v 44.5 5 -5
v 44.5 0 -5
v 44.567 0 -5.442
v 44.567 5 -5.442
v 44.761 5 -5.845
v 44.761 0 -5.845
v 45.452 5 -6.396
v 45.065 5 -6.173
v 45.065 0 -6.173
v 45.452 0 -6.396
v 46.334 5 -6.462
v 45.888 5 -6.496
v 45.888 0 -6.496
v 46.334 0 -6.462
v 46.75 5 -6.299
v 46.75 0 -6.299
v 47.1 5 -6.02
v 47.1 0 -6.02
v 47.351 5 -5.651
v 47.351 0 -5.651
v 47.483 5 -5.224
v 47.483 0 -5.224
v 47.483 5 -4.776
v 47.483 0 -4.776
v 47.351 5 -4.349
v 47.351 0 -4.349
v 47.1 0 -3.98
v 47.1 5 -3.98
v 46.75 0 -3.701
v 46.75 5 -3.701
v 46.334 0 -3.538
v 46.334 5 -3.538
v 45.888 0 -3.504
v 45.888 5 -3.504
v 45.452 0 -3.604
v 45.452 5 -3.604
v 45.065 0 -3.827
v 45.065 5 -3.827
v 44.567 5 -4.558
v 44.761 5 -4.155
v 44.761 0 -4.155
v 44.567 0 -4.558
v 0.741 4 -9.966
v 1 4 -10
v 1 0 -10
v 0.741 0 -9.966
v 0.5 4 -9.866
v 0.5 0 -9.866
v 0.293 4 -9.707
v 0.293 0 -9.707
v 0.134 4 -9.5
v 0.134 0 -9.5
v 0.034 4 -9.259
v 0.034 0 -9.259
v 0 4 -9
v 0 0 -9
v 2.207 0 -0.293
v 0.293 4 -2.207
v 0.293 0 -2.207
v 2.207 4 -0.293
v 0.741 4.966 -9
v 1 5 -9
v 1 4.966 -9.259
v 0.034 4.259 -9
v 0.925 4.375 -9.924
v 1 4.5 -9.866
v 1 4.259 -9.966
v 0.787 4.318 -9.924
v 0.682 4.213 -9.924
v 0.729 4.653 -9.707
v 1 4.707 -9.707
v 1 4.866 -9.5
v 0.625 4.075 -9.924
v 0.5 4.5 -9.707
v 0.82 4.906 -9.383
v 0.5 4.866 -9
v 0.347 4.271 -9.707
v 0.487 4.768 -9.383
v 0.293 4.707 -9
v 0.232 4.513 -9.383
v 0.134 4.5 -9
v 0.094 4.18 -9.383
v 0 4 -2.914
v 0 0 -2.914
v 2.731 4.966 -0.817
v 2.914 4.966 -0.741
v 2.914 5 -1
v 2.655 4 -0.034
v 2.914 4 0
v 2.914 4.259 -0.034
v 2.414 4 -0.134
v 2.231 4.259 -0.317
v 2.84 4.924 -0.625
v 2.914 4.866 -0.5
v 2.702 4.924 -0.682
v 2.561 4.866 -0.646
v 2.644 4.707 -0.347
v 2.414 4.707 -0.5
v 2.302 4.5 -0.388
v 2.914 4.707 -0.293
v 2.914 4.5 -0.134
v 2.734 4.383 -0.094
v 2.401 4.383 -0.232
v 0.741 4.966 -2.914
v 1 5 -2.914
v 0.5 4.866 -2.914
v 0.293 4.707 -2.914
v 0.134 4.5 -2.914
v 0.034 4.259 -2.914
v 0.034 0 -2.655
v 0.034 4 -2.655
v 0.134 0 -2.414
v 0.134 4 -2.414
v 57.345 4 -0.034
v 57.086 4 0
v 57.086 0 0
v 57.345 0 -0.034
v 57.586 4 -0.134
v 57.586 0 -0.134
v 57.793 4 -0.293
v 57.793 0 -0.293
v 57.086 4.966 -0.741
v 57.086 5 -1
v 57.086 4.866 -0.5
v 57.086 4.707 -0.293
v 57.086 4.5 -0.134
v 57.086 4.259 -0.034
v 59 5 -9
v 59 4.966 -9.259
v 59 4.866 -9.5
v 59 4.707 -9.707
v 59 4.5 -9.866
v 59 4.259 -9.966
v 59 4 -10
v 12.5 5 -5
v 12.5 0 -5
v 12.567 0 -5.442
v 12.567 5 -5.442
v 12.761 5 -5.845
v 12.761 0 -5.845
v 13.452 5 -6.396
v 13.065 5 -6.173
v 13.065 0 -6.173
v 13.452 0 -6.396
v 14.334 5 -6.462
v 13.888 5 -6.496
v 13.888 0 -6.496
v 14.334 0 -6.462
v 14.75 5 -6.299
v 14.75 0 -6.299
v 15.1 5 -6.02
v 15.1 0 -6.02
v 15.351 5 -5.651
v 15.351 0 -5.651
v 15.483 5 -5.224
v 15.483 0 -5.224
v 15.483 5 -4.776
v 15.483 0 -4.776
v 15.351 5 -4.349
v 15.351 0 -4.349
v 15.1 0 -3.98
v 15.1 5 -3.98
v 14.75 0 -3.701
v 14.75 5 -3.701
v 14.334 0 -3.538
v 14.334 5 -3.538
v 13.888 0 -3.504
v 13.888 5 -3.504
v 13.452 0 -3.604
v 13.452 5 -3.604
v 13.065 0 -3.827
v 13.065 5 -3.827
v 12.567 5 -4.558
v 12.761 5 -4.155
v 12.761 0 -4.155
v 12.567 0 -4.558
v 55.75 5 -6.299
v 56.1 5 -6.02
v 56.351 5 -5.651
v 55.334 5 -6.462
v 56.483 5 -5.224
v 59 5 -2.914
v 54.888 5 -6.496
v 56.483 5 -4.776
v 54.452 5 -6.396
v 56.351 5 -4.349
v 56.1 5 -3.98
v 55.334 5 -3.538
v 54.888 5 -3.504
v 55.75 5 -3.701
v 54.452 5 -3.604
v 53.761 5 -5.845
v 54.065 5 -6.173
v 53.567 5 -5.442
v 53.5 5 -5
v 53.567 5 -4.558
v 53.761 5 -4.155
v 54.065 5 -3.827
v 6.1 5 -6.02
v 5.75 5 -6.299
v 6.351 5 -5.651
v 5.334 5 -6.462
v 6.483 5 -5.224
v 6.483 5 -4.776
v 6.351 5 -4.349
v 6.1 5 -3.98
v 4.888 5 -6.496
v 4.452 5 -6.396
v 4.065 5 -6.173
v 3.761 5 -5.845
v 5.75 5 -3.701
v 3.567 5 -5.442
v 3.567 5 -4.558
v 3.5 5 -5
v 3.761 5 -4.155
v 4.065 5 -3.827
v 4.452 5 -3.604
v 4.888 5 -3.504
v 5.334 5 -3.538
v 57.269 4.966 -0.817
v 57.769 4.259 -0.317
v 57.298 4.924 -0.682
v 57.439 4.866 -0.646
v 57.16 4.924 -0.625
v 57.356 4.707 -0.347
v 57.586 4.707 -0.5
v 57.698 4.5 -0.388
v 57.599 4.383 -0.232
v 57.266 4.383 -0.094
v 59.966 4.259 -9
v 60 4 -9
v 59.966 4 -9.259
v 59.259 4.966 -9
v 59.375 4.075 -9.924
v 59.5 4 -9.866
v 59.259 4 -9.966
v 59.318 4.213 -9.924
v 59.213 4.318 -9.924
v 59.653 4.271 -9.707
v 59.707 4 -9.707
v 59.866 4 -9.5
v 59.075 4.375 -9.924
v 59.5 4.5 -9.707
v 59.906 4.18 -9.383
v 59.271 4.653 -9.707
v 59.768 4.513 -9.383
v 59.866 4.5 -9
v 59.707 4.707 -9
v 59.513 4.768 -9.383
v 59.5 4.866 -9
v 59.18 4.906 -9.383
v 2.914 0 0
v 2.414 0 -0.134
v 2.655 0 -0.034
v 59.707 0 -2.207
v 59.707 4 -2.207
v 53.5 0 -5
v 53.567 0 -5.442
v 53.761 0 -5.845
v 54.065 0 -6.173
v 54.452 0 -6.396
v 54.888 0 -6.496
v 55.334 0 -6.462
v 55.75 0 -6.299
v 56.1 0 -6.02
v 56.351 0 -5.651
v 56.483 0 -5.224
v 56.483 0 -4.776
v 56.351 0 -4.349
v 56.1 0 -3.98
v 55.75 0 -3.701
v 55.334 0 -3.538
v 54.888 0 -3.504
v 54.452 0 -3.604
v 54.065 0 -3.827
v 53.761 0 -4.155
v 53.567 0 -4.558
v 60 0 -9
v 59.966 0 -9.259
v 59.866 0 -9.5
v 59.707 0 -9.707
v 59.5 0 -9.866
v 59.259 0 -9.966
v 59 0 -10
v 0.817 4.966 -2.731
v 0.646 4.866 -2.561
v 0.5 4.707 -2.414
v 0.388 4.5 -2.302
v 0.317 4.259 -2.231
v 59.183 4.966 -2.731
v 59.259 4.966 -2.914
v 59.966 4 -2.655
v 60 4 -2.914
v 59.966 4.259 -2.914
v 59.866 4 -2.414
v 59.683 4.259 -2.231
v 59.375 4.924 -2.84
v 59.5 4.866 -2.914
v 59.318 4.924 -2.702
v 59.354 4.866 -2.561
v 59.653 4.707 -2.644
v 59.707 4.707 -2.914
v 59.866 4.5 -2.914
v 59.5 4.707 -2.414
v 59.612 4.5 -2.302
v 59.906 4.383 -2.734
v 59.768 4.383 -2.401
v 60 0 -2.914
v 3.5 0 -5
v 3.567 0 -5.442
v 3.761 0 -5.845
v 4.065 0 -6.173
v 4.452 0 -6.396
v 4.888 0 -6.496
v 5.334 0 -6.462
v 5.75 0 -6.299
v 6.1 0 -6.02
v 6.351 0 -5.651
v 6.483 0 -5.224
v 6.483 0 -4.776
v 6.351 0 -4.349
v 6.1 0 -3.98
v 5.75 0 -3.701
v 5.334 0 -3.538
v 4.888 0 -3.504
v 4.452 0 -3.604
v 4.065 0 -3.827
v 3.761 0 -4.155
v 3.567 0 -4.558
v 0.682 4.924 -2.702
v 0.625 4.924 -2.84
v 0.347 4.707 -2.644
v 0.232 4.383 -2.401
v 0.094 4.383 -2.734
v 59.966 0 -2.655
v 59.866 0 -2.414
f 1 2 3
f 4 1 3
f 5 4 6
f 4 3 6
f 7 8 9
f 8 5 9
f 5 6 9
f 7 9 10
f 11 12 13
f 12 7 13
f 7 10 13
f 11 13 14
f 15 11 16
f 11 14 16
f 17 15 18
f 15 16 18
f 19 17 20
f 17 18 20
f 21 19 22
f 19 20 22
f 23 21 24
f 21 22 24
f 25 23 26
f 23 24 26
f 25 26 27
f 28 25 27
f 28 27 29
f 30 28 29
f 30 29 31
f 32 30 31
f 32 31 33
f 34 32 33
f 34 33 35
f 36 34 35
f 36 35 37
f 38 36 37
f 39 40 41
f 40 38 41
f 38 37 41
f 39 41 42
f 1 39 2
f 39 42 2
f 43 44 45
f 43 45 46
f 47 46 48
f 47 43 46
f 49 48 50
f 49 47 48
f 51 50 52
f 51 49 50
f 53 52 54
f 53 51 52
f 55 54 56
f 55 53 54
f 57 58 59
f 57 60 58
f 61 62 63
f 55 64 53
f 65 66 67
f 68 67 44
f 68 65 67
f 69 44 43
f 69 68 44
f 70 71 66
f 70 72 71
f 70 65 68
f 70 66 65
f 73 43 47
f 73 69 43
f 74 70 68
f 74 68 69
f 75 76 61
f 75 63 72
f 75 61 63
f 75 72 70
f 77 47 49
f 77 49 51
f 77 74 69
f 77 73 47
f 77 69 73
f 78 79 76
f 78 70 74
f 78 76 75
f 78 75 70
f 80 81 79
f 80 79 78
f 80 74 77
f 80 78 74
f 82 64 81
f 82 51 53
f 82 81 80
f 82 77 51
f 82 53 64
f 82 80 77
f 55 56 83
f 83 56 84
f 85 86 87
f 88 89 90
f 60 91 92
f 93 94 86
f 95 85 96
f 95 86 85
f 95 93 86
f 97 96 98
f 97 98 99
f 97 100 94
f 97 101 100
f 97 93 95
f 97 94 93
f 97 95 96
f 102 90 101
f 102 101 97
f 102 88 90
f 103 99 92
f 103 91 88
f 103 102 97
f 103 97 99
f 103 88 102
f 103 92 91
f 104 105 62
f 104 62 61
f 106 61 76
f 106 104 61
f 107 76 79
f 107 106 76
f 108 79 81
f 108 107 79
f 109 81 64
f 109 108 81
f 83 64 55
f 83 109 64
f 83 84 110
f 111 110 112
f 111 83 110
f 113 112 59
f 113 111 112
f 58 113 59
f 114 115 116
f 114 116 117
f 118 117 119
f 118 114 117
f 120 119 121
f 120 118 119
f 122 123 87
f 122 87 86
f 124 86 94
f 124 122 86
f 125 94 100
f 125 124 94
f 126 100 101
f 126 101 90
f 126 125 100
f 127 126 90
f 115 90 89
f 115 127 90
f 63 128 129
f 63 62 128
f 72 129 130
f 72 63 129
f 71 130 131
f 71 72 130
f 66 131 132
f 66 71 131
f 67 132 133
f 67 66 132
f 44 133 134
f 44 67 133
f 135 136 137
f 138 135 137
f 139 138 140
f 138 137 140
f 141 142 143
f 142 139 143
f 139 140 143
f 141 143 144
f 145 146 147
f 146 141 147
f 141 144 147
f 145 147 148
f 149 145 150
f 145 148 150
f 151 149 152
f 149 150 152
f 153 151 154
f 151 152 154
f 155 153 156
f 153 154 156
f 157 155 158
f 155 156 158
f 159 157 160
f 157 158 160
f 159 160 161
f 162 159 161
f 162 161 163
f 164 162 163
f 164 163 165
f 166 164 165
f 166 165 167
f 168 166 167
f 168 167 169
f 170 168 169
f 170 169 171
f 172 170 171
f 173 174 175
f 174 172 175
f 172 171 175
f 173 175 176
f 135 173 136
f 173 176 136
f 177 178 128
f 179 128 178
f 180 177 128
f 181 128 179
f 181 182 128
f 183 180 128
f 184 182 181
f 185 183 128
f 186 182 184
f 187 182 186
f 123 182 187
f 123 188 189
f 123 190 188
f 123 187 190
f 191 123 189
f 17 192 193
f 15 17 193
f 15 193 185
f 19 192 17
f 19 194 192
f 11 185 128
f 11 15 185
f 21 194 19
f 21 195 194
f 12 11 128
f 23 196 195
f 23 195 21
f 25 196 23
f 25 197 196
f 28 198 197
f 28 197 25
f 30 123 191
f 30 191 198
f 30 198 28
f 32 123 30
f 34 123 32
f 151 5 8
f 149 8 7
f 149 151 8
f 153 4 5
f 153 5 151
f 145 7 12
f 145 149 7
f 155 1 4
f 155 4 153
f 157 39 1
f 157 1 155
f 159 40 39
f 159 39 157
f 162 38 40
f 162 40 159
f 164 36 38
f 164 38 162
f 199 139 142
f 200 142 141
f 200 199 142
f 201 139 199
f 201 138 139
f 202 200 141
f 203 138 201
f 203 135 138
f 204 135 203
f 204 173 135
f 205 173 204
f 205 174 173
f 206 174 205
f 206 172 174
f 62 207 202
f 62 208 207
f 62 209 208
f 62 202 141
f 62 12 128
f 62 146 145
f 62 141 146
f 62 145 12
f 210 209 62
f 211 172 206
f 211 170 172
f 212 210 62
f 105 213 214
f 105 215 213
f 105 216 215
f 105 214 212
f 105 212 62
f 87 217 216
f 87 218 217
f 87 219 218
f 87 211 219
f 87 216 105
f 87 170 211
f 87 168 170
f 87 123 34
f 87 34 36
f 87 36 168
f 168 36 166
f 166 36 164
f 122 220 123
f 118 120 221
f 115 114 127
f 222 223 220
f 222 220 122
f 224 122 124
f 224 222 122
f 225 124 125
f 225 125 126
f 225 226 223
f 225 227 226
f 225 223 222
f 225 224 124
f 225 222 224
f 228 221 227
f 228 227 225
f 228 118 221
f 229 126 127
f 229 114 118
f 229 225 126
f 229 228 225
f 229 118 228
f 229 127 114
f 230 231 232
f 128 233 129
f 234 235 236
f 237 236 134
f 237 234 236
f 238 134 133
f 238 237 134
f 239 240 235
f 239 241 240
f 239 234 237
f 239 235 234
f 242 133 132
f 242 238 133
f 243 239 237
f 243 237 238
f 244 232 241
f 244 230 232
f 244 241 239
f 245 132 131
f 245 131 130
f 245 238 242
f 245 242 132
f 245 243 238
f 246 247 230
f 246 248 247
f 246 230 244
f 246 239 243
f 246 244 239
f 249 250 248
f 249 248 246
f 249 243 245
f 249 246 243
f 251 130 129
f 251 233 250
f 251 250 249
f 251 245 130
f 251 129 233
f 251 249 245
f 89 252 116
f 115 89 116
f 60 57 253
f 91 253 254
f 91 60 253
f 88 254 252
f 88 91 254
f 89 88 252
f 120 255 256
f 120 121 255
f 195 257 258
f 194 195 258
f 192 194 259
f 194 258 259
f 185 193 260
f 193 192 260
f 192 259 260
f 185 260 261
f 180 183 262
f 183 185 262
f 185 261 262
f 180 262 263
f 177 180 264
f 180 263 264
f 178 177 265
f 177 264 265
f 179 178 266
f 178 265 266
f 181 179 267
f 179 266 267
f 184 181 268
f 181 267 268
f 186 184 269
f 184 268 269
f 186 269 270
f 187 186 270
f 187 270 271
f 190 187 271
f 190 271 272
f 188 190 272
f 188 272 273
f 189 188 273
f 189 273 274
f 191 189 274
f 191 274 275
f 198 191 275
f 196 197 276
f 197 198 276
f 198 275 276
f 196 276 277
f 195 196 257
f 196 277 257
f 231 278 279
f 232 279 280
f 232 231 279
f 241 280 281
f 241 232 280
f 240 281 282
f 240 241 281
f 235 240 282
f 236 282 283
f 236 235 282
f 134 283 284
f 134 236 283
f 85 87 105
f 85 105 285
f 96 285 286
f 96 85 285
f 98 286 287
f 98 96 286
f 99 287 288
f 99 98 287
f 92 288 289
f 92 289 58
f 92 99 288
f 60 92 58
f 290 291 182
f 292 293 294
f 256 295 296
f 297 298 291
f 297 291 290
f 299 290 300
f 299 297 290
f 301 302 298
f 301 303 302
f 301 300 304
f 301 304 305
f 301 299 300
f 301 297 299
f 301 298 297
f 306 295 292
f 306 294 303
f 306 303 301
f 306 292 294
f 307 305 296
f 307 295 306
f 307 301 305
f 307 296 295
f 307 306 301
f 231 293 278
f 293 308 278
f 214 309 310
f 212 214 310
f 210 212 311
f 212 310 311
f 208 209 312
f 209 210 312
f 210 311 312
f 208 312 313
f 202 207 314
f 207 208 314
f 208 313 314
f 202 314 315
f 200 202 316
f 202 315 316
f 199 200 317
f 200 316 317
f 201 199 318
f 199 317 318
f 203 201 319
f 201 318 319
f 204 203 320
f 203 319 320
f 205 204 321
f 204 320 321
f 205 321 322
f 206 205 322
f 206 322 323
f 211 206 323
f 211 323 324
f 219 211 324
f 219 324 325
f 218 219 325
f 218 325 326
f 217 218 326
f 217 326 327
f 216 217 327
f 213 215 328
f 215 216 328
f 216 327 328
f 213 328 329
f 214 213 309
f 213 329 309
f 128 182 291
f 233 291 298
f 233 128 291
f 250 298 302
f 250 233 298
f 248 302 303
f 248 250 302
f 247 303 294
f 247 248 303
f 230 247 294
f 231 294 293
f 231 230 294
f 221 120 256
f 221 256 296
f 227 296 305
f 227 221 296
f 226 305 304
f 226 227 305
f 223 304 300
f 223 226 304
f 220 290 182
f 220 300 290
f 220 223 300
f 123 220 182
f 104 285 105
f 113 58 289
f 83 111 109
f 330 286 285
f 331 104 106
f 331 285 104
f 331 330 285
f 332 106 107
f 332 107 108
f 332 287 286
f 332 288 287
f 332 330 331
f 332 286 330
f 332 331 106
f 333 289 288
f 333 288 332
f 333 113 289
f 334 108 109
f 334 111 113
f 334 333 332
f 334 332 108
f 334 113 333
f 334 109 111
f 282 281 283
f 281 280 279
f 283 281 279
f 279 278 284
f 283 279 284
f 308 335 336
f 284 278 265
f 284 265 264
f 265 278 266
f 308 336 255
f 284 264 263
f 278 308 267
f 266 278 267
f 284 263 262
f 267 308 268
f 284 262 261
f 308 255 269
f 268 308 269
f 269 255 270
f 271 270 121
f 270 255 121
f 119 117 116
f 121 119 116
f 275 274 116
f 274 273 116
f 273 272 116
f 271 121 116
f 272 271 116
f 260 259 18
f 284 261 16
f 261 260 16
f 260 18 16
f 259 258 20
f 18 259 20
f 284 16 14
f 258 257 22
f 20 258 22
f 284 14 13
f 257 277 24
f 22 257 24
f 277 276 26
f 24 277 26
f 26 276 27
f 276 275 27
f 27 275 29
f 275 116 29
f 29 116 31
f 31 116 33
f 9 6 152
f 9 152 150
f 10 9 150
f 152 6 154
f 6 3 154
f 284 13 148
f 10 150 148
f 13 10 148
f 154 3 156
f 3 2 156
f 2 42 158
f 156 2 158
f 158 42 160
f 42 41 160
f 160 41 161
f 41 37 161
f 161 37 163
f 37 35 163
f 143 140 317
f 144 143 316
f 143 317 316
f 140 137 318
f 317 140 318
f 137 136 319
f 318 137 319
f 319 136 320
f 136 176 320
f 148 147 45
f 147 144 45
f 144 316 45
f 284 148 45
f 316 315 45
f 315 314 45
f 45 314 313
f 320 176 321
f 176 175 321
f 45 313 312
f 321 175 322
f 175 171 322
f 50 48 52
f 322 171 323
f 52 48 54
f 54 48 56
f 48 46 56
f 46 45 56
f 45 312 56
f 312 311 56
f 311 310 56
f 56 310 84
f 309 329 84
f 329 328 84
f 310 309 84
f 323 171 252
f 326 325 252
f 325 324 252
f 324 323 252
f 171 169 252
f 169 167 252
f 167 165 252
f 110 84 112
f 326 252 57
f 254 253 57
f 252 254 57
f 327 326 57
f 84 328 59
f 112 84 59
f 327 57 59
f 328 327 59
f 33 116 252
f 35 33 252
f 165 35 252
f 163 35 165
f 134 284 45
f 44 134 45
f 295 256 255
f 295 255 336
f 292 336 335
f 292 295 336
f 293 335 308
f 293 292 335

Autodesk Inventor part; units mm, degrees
ref_plane "YZ Plane" through (0, 0, 0) normal (1, 0, 0) x (0, 1, 0)
ref_plane "XZ Plane" through (0, 0, 0) normal (0, 1, 0) x (-1, 0, 0)
ref_plane "XY Plane" through (0, 0, 0) normal (0, 0, 1) x (1, 0, 0)
sketch "Sketch1" plane through (0, 0, 0) normal (0, 1, 0) x (-1, 0, 0)
  line L0 (0, 0) -> (-60, 0)
  line L1 (-60, 0) -> (-60, -10)
  line L2 (-60, -10) -> (0, -10)
  line L3 (0, -10) -> (0, 0)
  circle A0 centre (-5, -5) radius 1.5
  circle A1 centre (-55, -5) radius 1.5
  line L4 (-30, -10) -> (-30, 0) construction
  line L5 (0, -5) -> (-5, -5) construction
  line L6 (-5, -5) -> (-30, -5) construction
  line L7 (-55, -5) -> (-60, -5) construction
  circle A2 centre (-14, -5) radius 1.5
  line L8 (-30, -5) -> (-55, -5) construction
  circle A3 centre (-46, -5) radius 1.5
  dimension "d0" = 60
  dimension "d1" = 10
  dimension "d2" = 3
  dimension "d3" = 3
  dimension "d4" = 5
  dimension "d5" = 5
  dimension "d6" = 5
  dimension "d7" = 5
  dimension "d9" = 3
  dimension "d10" = 16
extrude "Extrusion1" add sketch "Sketch1" along normal blind 5
chamfer "Chamfer1" distance 2.5 angle 45 2 edges at (0, 2.5, 0) (60, 2.5, 0)
fillet "Fillet1" radius 1 12 edges at (30, 5, 0) (1.25, 5, -1.25) (0, 5, -6.25) (0, 2.5, -2.5) (2.5, 2.5, 0) (57.5, 2.5, 0) (58.75, 5, -1.25) (60, 2.5, -2.5) (60, 5, -6.25) (60, 2.5, -10) (0, 2.5, -10) (30, 5, -10)
equation "\"d3\" = d2"
equation "\"d5\" = d4"
equation "\"d6\" = 0.5 * d1"
equation "\"d7\" = d6"
equation "\"d9\" = d2"
properties part number "fan_duct_holder"
